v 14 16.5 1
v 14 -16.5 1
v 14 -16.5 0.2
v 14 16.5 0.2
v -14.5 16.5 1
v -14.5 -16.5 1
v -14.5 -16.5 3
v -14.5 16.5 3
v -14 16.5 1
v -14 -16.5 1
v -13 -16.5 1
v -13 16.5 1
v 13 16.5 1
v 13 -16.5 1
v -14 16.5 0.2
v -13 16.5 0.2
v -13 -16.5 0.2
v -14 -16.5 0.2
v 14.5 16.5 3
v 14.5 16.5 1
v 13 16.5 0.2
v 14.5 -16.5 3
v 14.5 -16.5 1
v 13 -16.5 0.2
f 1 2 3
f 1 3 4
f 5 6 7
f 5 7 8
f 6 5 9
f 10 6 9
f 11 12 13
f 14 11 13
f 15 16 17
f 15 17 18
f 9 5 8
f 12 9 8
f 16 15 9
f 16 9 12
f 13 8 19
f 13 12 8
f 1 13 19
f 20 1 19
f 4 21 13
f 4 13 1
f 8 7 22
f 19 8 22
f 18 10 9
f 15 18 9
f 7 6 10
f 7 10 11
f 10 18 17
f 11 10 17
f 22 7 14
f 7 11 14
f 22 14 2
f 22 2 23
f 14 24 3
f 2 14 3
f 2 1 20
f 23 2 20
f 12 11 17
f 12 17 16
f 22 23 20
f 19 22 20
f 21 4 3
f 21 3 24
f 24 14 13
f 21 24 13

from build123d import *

# Parameters (mm, degrees)
SKETCH3_W           = 29
SKETCH3_H           = 33
BOSS_EXTRUDE1_DEPTH = 2
SKETCH5_W           = 1
SKETCH5_H           = 33
BOSS_EXTRUDE2_DEPTH = 0.8


with BuildPart() as part:
    # Sketch3 → Boss-Extrude1 (new body)
    with BuildSketch(Plane.XY.offset(1)):
        Rectangle(SKETCH3_W, SKETCH3_H)
    extrude(amount=BOSS_EXTRUDE1_DEPTH)

    # Sketch5 → Boss-Extrude2 (add)
    with BuildSketch(Plane(origin=(0, 0, 1), x_dir=(-1, 0, 0), z_dir=(0, 0, -1))):
        with Locations((13.5, 0)):
            Rectangle(SKETCH5_W, SKETCH5_H)
        with Locations((-13.5, 0)):
            Rectangle(SKETCH5_W, SKETCH5_H)
    extrude(amount=BOSS_EXTRUDE2_DEPTH)


solid = part.part
